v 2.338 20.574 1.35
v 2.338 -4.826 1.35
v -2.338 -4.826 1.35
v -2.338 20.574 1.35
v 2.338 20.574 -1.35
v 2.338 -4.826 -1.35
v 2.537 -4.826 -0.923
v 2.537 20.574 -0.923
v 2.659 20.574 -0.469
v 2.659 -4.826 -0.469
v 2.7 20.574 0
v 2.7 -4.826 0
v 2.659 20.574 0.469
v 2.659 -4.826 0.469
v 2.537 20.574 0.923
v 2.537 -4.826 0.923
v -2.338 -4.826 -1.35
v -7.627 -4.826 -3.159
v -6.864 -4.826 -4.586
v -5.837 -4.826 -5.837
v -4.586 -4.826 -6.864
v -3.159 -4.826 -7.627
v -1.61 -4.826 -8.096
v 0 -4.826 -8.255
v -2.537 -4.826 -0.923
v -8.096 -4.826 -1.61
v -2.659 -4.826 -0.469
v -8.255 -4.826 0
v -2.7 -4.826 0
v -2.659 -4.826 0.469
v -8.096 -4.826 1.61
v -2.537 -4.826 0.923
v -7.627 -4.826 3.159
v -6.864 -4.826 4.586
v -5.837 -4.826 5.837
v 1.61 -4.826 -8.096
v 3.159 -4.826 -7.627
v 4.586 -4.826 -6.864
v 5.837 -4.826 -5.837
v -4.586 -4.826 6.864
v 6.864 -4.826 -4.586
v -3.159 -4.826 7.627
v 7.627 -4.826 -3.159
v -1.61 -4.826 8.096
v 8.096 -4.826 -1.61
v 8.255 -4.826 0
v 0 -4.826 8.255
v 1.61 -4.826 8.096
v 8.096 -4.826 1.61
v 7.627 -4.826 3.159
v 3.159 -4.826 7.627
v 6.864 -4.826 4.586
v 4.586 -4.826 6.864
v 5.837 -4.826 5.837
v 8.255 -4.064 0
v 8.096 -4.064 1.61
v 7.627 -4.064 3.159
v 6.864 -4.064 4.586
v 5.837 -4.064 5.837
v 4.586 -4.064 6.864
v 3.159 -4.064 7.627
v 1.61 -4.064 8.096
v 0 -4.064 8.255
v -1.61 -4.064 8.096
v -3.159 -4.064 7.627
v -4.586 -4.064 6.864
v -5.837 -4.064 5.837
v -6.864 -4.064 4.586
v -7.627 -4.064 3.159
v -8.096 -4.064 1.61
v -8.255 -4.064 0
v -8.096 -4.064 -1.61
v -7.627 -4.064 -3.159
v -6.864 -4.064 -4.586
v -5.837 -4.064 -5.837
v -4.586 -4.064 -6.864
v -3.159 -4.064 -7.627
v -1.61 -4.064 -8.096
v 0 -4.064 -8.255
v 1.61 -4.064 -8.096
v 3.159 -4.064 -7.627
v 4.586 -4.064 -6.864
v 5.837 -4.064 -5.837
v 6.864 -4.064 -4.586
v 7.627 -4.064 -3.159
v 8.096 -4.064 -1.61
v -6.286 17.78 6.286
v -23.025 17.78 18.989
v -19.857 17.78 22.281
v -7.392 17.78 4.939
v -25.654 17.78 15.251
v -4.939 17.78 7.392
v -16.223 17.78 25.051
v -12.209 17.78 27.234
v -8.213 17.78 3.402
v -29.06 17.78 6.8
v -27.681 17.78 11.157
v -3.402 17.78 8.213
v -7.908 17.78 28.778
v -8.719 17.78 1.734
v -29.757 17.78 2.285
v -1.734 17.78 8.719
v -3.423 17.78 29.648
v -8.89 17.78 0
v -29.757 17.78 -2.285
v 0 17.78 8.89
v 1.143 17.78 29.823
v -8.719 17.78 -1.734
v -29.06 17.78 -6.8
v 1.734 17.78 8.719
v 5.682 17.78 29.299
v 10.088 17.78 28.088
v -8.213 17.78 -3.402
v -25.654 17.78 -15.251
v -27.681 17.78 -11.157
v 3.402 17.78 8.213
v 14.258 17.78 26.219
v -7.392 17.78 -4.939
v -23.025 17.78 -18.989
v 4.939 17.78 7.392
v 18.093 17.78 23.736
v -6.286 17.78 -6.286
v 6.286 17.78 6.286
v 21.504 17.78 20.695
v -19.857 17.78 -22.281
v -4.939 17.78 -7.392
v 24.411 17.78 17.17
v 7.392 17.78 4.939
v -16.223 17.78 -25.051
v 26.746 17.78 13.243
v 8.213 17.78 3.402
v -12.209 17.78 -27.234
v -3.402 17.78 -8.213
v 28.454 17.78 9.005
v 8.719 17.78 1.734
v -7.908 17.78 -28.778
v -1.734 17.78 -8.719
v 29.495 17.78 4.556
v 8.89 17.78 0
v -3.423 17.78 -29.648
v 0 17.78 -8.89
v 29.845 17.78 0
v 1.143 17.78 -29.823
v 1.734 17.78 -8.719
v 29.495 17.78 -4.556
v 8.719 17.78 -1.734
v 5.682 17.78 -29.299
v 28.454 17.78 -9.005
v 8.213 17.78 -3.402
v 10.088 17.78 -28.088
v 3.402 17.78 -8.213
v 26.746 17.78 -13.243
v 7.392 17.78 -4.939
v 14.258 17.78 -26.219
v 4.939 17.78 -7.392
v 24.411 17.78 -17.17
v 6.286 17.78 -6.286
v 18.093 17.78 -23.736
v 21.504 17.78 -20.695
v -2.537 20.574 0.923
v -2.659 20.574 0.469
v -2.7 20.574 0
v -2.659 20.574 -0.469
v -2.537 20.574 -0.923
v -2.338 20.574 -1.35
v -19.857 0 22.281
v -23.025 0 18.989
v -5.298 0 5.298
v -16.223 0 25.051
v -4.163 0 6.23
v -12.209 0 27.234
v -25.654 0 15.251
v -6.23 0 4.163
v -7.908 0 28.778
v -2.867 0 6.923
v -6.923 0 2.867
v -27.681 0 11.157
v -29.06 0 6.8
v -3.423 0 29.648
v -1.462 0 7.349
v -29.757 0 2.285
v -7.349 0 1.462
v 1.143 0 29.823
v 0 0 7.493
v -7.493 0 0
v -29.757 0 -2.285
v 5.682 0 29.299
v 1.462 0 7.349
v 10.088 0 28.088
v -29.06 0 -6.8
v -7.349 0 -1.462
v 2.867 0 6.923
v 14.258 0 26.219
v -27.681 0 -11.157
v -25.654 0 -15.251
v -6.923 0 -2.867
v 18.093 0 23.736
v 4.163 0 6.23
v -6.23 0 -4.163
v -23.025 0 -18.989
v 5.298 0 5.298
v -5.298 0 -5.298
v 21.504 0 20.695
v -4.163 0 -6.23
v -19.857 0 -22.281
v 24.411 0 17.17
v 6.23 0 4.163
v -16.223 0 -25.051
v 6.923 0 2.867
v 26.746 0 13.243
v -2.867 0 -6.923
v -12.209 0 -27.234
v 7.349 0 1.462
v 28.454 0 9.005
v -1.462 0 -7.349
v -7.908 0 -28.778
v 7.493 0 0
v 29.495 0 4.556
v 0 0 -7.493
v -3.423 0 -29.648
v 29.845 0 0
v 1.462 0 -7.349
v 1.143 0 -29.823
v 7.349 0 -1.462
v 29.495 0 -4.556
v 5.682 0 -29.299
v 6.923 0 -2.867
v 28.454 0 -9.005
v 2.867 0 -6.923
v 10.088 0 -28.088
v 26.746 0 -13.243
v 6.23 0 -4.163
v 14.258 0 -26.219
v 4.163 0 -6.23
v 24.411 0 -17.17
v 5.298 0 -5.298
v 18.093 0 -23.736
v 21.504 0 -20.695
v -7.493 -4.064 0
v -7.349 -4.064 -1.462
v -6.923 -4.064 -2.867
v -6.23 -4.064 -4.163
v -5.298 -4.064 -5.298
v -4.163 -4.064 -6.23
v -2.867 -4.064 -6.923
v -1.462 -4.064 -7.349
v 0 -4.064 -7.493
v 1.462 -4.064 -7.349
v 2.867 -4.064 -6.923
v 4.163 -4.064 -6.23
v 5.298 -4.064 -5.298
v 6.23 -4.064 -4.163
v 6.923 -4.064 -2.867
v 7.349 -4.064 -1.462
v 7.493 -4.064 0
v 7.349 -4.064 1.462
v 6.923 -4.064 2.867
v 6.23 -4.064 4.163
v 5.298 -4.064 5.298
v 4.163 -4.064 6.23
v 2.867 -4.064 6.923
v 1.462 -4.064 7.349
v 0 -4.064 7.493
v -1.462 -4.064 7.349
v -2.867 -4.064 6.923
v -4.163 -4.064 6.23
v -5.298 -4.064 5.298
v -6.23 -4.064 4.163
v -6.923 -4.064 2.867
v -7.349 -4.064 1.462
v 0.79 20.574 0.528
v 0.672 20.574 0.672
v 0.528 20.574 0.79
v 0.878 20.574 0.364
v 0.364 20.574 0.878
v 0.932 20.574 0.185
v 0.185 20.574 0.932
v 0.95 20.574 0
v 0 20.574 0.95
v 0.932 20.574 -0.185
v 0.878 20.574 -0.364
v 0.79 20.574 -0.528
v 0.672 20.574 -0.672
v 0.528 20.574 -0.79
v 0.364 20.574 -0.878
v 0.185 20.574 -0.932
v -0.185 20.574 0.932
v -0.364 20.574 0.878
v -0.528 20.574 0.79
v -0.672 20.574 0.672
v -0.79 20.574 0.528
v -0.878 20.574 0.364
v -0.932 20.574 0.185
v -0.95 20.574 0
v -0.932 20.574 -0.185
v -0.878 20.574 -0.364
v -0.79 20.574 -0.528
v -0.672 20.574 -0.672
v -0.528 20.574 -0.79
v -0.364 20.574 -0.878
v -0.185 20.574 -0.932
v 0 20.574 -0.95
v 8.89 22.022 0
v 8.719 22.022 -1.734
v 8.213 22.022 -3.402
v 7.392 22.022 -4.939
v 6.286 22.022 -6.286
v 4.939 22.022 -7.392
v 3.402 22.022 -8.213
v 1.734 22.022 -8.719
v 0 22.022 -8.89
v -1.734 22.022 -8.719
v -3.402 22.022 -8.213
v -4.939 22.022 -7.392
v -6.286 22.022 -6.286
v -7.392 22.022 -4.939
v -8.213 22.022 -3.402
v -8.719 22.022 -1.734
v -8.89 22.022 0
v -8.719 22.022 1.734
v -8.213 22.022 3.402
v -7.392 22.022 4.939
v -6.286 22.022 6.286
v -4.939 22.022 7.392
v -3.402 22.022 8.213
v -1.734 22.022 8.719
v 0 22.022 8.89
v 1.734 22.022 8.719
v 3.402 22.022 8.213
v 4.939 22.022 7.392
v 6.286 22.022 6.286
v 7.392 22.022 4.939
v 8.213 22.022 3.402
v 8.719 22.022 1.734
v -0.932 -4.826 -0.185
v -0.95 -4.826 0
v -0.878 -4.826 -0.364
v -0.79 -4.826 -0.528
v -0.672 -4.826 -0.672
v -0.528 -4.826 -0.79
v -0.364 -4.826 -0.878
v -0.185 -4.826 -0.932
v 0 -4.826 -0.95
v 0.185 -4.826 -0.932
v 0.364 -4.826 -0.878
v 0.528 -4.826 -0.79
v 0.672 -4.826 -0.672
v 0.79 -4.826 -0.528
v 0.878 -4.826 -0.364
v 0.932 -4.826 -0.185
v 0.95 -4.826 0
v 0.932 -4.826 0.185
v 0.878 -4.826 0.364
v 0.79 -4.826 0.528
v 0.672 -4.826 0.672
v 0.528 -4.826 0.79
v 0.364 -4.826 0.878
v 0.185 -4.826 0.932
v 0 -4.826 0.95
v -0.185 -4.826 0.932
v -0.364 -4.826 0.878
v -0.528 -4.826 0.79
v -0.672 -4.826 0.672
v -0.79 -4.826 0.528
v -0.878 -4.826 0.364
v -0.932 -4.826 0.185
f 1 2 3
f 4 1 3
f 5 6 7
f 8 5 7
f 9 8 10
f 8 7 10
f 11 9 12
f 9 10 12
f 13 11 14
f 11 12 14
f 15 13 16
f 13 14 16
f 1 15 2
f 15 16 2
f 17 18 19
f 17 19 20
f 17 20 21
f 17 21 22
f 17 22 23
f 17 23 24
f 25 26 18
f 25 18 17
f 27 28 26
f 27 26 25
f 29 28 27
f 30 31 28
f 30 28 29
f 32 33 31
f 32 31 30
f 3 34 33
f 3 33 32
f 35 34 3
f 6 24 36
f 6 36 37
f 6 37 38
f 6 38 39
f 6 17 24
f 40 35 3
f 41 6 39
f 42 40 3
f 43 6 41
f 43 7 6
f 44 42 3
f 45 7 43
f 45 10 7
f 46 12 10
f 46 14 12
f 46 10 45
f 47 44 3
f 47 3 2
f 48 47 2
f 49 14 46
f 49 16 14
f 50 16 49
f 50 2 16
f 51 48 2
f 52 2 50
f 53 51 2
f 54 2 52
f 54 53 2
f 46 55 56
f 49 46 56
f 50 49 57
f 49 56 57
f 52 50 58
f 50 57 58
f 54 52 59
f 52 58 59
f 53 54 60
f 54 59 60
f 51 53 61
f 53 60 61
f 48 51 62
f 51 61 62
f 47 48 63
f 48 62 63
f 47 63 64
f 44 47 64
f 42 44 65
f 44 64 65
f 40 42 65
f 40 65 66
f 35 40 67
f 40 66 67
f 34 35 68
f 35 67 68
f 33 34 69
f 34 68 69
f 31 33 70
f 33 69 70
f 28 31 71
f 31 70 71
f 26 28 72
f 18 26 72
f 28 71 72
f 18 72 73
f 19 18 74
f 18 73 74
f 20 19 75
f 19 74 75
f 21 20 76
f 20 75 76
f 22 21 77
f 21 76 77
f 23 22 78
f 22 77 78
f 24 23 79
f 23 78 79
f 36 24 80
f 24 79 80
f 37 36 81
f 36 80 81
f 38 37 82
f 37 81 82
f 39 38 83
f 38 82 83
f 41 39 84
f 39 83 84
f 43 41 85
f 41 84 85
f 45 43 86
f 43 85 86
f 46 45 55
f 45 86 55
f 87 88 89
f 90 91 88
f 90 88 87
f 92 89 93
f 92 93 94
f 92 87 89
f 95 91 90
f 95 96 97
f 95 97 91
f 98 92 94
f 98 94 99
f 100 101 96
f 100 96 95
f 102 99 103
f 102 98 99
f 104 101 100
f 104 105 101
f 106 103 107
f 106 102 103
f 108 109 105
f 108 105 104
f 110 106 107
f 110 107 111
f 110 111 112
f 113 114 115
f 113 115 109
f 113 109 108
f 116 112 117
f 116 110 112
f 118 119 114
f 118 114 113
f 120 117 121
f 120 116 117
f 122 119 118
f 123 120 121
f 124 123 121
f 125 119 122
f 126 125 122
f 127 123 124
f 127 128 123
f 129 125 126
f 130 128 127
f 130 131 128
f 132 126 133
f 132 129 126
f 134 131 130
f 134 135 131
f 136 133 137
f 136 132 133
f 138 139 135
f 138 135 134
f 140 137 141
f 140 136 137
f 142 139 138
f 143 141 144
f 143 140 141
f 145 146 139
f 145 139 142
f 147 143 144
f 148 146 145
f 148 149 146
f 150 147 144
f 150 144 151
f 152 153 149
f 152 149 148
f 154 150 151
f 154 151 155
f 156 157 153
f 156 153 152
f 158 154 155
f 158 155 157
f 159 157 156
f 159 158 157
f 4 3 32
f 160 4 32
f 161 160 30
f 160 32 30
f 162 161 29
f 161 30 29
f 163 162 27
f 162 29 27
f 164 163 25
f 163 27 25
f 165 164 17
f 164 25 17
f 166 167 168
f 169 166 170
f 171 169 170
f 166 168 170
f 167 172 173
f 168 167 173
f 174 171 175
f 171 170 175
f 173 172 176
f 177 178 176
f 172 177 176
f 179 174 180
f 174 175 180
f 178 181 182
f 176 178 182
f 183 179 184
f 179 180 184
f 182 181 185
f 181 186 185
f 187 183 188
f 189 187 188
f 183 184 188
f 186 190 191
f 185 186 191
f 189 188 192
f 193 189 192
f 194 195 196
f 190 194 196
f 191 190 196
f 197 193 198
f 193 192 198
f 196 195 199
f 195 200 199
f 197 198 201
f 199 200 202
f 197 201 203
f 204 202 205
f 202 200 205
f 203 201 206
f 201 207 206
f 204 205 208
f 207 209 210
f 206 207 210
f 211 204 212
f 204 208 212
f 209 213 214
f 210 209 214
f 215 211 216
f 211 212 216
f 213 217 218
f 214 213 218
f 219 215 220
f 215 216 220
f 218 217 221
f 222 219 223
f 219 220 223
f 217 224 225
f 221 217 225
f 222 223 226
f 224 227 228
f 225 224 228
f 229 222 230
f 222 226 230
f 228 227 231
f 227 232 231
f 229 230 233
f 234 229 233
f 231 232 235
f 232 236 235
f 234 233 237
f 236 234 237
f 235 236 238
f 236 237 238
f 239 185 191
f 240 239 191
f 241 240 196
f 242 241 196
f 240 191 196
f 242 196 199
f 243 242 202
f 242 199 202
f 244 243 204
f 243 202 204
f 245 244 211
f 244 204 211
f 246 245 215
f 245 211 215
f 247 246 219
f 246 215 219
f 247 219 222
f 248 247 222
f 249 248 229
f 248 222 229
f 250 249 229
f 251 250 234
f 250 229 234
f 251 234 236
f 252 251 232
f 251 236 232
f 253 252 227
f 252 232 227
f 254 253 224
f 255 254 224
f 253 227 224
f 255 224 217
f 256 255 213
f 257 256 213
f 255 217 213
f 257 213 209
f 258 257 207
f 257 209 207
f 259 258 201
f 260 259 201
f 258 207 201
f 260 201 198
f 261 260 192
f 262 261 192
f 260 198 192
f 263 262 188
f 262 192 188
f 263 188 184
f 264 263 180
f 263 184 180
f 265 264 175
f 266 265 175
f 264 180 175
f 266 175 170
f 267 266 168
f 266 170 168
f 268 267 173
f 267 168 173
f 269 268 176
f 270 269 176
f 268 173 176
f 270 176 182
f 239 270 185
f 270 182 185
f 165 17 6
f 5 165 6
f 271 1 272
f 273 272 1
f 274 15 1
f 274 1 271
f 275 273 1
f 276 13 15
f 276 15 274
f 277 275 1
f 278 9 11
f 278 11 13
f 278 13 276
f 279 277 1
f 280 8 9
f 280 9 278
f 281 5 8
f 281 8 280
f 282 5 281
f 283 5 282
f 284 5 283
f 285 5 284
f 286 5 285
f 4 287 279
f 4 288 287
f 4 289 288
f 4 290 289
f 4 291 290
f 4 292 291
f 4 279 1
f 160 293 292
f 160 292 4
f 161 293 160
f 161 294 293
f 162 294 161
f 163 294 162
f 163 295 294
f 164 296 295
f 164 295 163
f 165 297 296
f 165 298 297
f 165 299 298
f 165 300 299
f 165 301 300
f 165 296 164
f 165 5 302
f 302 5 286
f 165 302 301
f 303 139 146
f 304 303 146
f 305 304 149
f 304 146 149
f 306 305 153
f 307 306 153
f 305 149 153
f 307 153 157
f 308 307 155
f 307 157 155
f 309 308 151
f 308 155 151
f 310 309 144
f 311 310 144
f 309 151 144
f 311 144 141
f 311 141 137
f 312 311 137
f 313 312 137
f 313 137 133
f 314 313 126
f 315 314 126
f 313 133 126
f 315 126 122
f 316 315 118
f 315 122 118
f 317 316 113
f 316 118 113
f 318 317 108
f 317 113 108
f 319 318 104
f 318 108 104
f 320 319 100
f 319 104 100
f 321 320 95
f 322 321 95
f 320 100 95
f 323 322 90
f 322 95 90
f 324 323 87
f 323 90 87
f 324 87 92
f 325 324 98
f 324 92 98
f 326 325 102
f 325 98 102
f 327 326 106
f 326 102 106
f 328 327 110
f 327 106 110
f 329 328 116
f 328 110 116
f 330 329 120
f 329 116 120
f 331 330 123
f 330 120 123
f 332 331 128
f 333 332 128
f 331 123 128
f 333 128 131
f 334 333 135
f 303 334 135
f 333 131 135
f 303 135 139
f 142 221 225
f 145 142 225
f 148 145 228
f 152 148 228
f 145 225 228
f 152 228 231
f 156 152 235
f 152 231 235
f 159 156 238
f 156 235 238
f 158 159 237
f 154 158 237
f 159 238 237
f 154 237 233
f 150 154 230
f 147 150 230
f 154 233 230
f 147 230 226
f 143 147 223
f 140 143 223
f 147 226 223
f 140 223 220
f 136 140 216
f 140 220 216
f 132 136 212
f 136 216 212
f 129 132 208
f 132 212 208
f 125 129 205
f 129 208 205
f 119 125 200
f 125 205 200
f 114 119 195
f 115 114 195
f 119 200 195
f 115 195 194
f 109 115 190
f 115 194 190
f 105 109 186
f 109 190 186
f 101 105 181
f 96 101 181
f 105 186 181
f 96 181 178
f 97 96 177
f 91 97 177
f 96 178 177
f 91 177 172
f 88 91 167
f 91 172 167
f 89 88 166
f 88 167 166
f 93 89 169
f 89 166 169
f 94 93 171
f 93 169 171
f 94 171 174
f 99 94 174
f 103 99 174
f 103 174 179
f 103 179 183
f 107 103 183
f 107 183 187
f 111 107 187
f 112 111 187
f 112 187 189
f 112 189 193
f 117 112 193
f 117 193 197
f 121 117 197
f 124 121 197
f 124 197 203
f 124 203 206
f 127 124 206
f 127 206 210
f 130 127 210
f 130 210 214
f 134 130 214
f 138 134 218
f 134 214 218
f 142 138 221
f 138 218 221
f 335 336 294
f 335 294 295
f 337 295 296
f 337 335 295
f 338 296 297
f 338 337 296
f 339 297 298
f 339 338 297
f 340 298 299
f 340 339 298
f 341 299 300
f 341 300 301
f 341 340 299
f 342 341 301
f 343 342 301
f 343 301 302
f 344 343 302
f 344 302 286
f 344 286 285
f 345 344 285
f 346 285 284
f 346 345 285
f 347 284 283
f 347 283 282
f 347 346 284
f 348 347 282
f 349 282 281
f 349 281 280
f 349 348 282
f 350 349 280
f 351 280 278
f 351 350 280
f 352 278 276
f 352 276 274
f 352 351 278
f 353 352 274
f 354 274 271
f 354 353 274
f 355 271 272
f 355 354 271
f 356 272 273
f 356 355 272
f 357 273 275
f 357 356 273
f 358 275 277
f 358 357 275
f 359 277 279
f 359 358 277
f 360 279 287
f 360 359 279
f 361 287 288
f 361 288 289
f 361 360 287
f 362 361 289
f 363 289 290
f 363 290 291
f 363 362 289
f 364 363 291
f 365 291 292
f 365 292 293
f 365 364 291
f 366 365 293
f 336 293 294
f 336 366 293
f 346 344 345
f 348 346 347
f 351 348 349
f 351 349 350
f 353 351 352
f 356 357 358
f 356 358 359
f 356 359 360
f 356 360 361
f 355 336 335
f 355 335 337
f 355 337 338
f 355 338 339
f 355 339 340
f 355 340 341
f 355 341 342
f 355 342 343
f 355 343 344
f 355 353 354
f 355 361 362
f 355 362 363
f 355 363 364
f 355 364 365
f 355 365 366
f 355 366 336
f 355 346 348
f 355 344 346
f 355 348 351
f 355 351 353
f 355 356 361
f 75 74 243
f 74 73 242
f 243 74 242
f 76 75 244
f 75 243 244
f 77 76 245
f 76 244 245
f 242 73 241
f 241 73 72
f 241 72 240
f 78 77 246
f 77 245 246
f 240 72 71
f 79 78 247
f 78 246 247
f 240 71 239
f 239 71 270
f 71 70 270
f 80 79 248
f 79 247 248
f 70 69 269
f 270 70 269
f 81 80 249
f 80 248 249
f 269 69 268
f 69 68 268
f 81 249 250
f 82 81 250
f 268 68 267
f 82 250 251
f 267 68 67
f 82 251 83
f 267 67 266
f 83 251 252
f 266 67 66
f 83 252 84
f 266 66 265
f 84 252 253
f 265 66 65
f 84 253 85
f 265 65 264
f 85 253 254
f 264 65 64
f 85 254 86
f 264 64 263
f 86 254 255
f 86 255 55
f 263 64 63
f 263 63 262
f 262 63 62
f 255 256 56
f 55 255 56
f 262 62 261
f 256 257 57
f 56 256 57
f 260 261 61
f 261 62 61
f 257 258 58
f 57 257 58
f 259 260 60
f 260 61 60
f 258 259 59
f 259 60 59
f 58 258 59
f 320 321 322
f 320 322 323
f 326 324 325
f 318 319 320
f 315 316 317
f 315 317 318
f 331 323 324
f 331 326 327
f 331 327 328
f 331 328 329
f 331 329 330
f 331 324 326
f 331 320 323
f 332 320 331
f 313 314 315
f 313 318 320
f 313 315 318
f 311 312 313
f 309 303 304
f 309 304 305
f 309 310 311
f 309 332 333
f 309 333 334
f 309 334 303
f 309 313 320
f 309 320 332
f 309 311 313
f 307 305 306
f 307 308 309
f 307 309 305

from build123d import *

# Parameters (mm, degrees)
SKETCH1_R           = 29.845
BOSS_EXTRUDE1_DEPTH = 17.78
SKETCH2_R           = 8.89
BOSS_EXTRUDE2_DEPTH = 4.2418
SKETCH3_R           = 7.493
BOSS_EXTRUDE3_DEPTH = 4.064
SKETCH4_R           = 8.255
BOSS_EXTRUDE4_DEPTH = 0.762
SKETCH6_R           = 0.95
CUT_EXTRUDE1_DEPTH  = 25.4


with BuildPart() as part:
    # Sketch1 → Boss-Extrude1 (new body)
    with BuildSketch(Plane(origin=(0, 0, 0), x_dir=(1, 0, 0), z_dir=(0, 1, 0))):
        Circle(SKETCH1_R)
    extrude(amount=BOSS_EXTRUDE1_DEPTH)

    # Sketch2 → Boss-Extrude2 (add)
    with BuildSketch(Plane(origin=(0, 17.78, 0), x_dir=(1, 0, 0), z_dir=(0, 1, 0))):
        Circle(SKETCH2_R)
    extrude(amount=BOSS_EXTRUDE2_DEPTH)

    # Sketch3 → Boss-Extrude3 (add)
    with BuildSketch(Plane(origin=(0, 0, 0), x_dir=(-1, 0, 0), z_dir=(0, -1, 0))):
        Circle(SKETCH3_R)
    extrude(amount=BOSS_EXTRUDE3_DEPTH)

    # Sketch4 → Boss-Extrude4 (add)
    with BuildSketch(Plane.XZ.offset(4.064)):
        Circle(SKETCH4_R)
    extrude(amount=BOSS_EXTRUDE4_DEPTH)

    # Sketch6 → Cut-Extrude1 (cut)
    with BuildSketch(Plane(origin=(0, -4.826, 0), x_dir=(-1, 0, 0), z_dir=(0, -1, 0))):
        with BuildLine():
            Line((-2.33826859, -1.35), (2.33826859, -1.35))
            ThreePointArc((2.33826859, -1.35), (2.7, 0), (2.33826859, 1.35))
            Line((2.33826859, 1.35), (-2.33826859, 1.35))
            ThreePointArc((-2.33826859, 1.35), (-2.7, 0), (-2.33826859, -1.35))
        make_face()
        Circle(SKETCH6_R, mode=Mode.SUBTRACT)
    extrude(amount=-CUT_EXTRUDE1_DEPTH, mode=Mode.SUBTRACT)


solid = part.part
